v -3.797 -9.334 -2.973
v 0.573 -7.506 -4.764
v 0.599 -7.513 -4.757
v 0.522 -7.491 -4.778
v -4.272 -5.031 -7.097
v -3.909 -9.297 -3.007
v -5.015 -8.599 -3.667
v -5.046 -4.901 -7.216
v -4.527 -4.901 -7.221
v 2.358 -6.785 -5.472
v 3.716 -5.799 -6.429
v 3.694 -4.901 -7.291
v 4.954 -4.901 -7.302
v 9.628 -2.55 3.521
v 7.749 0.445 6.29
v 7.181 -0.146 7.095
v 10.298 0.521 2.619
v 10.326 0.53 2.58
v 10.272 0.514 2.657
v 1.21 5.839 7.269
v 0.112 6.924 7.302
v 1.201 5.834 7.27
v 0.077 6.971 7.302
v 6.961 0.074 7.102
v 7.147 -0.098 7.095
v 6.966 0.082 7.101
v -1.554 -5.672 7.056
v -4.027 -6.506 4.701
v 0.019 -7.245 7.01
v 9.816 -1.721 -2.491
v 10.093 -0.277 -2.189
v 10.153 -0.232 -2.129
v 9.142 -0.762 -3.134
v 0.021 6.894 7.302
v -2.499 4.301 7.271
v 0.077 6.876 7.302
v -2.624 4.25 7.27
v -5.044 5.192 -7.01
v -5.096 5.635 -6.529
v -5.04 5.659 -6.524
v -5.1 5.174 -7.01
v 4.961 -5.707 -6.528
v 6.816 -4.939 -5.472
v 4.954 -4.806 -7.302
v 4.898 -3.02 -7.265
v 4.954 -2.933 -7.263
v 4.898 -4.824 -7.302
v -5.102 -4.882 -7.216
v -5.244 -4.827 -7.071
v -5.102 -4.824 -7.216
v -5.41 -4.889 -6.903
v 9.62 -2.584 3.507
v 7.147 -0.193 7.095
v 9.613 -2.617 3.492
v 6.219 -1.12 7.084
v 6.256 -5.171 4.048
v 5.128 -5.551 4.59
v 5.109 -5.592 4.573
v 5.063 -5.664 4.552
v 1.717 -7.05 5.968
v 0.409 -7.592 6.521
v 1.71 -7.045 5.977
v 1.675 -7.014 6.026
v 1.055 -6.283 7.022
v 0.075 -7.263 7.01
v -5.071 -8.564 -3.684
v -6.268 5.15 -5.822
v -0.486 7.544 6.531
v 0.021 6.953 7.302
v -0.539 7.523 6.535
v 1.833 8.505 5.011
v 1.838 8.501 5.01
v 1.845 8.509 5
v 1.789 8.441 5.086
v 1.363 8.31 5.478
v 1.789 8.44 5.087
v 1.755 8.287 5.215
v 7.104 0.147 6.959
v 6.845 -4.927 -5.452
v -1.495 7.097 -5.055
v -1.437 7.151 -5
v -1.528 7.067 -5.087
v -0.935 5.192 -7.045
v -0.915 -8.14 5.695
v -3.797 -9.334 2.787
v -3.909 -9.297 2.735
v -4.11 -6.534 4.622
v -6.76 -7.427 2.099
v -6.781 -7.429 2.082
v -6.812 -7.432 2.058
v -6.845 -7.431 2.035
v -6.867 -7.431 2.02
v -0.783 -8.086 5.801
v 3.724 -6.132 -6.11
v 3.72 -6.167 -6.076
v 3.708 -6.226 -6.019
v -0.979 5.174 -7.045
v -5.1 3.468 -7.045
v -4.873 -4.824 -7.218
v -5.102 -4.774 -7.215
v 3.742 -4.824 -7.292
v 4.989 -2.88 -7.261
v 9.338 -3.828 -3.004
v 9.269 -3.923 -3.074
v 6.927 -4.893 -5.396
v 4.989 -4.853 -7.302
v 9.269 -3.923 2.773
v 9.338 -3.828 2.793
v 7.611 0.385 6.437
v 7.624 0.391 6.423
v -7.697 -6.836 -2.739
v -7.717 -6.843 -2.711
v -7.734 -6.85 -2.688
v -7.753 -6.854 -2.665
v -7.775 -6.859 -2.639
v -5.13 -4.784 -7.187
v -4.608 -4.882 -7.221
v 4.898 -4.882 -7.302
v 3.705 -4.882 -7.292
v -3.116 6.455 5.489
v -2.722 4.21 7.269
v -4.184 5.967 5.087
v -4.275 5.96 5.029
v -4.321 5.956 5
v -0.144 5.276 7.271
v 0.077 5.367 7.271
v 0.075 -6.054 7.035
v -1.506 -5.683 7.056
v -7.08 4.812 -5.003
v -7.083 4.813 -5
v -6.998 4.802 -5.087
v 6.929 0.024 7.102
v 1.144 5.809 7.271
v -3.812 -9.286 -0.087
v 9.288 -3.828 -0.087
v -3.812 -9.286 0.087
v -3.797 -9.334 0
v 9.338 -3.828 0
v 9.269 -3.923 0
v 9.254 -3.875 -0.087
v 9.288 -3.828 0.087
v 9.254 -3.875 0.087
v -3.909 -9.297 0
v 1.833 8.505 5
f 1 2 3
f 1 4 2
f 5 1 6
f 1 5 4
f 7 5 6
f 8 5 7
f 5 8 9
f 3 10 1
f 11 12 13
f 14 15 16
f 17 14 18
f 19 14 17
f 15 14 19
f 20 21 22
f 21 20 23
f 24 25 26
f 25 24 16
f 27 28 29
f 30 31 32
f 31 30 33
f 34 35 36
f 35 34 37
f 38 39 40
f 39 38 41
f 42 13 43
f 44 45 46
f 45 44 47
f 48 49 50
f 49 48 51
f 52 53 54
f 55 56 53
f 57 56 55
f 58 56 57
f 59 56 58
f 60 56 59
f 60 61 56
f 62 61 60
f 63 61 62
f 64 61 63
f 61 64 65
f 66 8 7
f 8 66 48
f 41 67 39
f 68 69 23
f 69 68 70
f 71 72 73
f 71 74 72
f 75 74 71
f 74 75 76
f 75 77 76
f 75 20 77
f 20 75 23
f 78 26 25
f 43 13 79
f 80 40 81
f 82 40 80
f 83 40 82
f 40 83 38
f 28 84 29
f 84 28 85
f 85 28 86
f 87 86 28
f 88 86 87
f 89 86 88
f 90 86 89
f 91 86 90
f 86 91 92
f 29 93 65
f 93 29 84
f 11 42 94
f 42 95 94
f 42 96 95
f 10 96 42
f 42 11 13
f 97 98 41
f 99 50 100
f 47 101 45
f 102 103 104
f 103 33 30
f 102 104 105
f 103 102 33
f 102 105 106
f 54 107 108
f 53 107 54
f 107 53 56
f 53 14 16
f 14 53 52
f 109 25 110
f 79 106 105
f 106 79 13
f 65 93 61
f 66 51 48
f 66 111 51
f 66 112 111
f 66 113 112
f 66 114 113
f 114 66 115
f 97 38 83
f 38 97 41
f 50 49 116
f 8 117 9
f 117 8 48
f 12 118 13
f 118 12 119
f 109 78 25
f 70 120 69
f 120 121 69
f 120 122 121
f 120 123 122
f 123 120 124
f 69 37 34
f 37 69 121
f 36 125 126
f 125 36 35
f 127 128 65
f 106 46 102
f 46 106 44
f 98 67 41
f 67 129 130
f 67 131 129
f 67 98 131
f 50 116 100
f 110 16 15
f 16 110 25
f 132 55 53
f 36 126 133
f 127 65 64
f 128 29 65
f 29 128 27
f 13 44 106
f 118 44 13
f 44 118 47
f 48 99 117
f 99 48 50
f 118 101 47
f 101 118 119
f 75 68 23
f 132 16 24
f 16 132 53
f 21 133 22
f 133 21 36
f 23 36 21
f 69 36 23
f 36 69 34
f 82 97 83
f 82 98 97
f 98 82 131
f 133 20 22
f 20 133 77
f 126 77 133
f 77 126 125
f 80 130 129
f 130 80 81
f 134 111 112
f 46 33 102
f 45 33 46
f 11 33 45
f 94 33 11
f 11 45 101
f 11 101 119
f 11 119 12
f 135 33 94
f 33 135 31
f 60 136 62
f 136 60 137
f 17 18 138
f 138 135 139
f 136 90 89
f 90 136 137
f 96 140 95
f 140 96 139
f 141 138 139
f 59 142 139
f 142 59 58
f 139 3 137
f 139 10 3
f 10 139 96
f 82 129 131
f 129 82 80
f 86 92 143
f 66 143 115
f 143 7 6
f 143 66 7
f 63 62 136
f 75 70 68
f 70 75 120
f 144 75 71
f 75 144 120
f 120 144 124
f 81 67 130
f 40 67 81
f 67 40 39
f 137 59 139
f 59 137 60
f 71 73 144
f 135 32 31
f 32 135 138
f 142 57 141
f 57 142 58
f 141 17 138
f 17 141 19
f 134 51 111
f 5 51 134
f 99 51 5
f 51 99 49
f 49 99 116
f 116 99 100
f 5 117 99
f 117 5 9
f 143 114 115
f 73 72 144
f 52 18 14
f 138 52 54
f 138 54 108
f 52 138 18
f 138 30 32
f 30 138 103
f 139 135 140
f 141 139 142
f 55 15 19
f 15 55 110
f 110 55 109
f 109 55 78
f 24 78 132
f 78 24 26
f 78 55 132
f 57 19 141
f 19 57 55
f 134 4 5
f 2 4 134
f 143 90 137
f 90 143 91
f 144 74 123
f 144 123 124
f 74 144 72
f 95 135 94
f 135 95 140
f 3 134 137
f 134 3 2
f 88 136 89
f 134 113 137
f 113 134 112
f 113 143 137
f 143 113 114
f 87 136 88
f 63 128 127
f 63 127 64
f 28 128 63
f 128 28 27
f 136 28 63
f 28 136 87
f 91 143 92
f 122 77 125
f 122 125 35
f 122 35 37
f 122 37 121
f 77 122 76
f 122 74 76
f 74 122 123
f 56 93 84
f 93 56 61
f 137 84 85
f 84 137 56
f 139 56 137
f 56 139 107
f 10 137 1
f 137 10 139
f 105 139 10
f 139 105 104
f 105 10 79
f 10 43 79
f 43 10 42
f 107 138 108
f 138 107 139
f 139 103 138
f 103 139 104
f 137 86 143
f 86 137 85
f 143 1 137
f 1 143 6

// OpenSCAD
// Auto-generated OpenSCAD file

    inner_points = 10*[[0.4619566327305774, 0.19130099183283442, -1.2071067811865475], [-0.46195663273057797, -0.19130099183283406, -1.2071067811865475], [0.46195663273057797, 0.19130099183283406, 1.2071067811865475], [-0.4619566327305774, -0.19130099183283442, 1.2071067811865475], [1.1152619679663673, 0.46184144897825313, -0.5000000000000002], [-1.1152619679663673, -0.461841448978253, -0.4999999999999998], [1.1152619679663673, 0.461841448978253, 0.4999999999999998], [-1.1152619679663673, -0.46184144897825313, 0.5000000000000002], [0.27054045714541874, -0.6533053352357897, -0.7071067811865477], [0.2705404571454191, -0.6533053352357899, 0.7071067811865475], [0.9238457923812087, -0.38276487809037096, -2.792716462039856e-16], [-0.38276487809037096, -0.9238457923812087, -4.7467621895578584e-17], [0.19141617558515864, 0.8446063270686242, -0.49999999999999994], [-0.7324970898759966, 0.46200434340295565, -0.4999999999999998], [0.19141617558515892, 0.844606327068624, 0.5000000000000001], [-0.7324970898759964, 0.4620043434029555, 0.5000000000000002]];

    outer_points = 10*[[-1.20715085540928, -0.49989358214569235, 8.597197695362629e-07], [-1.2069745470430784, 0.49989358214569235, 0.020630814483457764], [1.2069745470430784, -0.49989358214569235, -0.020630814483457764], [1.20715085540928, 0.49989358214569235, -8.597197695362629e-07], [-0.5001945645070083, -1.2068498657593993, -0.020629598656099847], [-0.49976891845816496, 1.2068498657593993, 0.029175517925539712], [0.49976891845816496, -1.2068498657593993, -0.029175517925539712], [0.5001945645070083, 1.2068498657593993, 0.020629598656099847], [-0.7010393684168068, -0.014588113623628919, 0.7129733451333711], [0.7131225510703787, -0.014588113623628919, 0.7008875901995837], [0.005916922485465028, -0.721544397237336, 0.6923428867575018], [0.006166260168106925, 0.6923681699900782, 0.721518048575453], [-0.5061114869924733, -0.4853054685220634, -0.7129724854136016], [-0.5059351786262719, 0.5144816957693212, -0.6923425306499132], [0.4938519959726999, -0.4853054685220634, -0.7215184046830415], [0.4940283043389013, 0.5144816957693212, -0.7008884499193532]];

    // Convex hull for inner set (I)
    module inner_hull() {
        hull() {
            for (p = inner_points) {
                translate(p) sphere(r=0.1);
            }
        }
    }

    // Convex hull for outer set (O) minus inner hull (O \ I)
    module outer_minus_inner() {
        difference() {
            hull() {
                for (p = outer_points) {
                    translate(p) sphere(r=0.1);
                }
            }
            inner_hull(); // Subtract inner hull
        }
    }

    // Convex hull for outer set (O) minus all translated inner hulls
    module outer_minus_AllTranslationInner() {
        difference() {
            hull() {
                for (p = outer_points) {
                    translate(p) sphere(r=0.1);
                }
            }
            hull() {
                translate([0,0,50]) inner_hull();
                translate([0,0,-50]) inner_hull();
            }; // Subtract translated inner hulls
        }
    }

    // Difference between outer_minus_inner and outer_minus_AllTranslationInner
    module outer_minus_inner_diff() {
        difference() {
            // Outer minus inner
            difference() {
                hull() {
                    for (p = outer_points) {
                        translate(p) sphere(r=0.1);
                    }
                }
                inner_hull();
            }

            // Subtract Outer minus AllTranslationInner
            difference() {
                hull() {
                    for (p = outer_points) {
                        translate(p) sphere(r=0.1);
                    }
                }
                hull() {
                    translate([0,0,50]) inner_hull();
                    translate([0,0,-50]) inner_hull();
                };
            }
        }
    }

    // Rendering all with colors applied
    color([1, 1, 0, 1]) outer_minus_inner_diff(); // Opaque yellow
    
